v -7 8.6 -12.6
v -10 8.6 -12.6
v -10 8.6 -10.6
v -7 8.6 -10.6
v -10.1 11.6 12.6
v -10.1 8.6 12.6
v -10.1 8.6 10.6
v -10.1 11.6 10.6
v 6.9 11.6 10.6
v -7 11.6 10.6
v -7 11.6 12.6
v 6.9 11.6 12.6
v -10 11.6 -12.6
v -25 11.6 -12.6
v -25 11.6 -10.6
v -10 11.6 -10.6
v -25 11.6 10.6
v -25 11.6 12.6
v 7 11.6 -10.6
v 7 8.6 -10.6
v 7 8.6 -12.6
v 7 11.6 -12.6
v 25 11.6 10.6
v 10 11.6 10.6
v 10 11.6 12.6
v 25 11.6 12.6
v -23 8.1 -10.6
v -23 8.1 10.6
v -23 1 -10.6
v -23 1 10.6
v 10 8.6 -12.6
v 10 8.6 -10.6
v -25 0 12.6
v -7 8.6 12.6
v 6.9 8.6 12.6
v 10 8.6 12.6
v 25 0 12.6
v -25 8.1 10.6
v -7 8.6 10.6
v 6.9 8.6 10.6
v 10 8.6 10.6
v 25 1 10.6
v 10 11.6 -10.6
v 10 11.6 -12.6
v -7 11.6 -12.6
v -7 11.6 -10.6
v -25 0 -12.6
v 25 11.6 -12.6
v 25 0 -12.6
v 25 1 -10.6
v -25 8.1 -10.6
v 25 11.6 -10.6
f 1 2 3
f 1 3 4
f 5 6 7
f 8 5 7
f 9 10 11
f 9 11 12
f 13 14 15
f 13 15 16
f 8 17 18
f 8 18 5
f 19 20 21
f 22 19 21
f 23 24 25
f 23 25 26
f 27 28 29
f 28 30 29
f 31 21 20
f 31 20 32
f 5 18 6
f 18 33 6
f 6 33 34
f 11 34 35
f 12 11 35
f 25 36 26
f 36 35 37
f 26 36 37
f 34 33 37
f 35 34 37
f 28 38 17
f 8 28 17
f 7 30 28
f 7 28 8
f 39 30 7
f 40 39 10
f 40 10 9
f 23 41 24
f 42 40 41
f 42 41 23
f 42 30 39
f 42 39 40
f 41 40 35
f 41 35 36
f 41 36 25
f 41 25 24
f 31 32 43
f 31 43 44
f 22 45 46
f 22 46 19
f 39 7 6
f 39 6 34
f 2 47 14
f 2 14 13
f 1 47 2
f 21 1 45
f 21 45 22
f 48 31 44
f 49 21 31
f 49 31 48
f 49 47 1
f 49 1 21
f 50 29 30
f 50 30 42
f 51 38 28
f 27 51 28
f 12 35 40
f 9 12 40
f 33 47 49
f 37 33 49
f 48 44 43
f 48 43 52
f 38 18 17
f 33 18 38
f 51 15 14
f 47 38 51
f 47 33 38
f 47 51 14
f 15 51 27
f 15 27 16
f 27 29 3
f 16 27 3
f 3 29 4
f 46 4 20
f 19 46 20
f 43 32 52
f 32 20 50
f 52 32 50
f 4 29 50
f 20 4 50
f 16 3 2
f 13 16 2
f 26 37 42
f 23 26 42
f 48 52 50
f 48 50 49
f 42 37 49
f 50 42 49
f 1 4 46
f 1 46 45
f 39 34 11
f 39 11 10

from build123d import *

# Parameters (mm, degrees)
SKETCH_1_W      = 50
SKETCH_1_H      = 25.2
EXTRUDE_1_DEPTH = 1
SKETCH_2_W      = 50
SKETCH_2_H      = 2
EXTRUDE_2_DEPTH = 7.6
SKETCH_4_W      = 15
SKETCH_4_H      = 2
SKETCH_4_W_2    = 14
EXTRUDE_3_DEPTH = 3
SKETCH_5_W      = 14.9
SKETCH_5_H      = 2
SKETCH_5_W_2    = 13.9
SKETCH_5_W_3    = 15
EXTRUDE_4_DEPTH = 3
SKETCH_6_W      = 2
SKETCH_6_H      = 25.2
EXTRUDE_5_DEPTH = 3.6
SKETCH_7_W      = 2
SKETCH_7_H      = 21.2
EXTRUDE_6_DEPTH = 3.5


with BuildPart() as part:
    # 草图1 → 凸台-拉伸1 (new body)
    with BuildSketch(Plane(origin=(0, 0, 0), x_dir=(1, 0, 0), z_dir=(0, 1, 0))):
        Rectangle(SKETCH_1_W, SKETCH_1_H)
    extrude(amount=EXTRUDE_1_DEPTH)

    # 草图2 → 凸台-拉伸2 (add)
    with BuildSketch(Plane(origin=(0, 1, 0), x_dir=(1, 0, 0), z_dir=(0, 1, 0))):
        with Locations((0, 11.6)):
            Rectangle(SKETCH_2_W, SKETCH_2_H)
        with Locations((0, -11.6)):
            Rectangle(SKETCH_2_W, SKETCH_2_H)
    extrude(amount=EXTRUDE_2_DEPTH)

    # 草图4 → 凸台-拉伸3 (add)
    with BuildSketch(Plane(origin=(0, 8.6, 0), x_dir=(1, 0, 0), z_dir=(0, 1, 0))):
        with Locations((-17.5, 11.6)):
            Rectangle(SKETCH_4_W, SKETCH_4_H)
        with Locations((0, 11.6)):
            Rectangle(SKETCH_4_W_2, SKETCH_4_H)
        with Locations((17.5, 11.6)):
            Rectangle(SKETCH_4_W, SKETCH_4_H)
    extrude(amount=EXTRUDE_3_DEPTH)

    # 草图5 → 凸台-拉伸4 (add)
    with BuildSketch(Plane(origin=(0, 8.6, 0), x_dir=(1, 0, 0), z_dir=(0, 1, 0))):
        with Locations((-17.55, -11.6)):
            Rectangle(SKETCH_5_W, SKETCH_5_H)
        with Locations((-0.05, -11.6)):
            Rectangle(SKETCH_5_W_2, SKETCH_5_H)
        with Locations((17.5, -11.6)):
            Rectangle(SKETCH_5_W_3, SKETCH_5_H)
    extrude(amount=EXTRUDE_4_DEPTH)

    # 草图6 → 凸台-拉伸5 (add)
    with BuildSketch(Plane(origin=(0, 1, 0), x_dir=(1, 0, 0), z_dir=(0, 1, 0))):
        with Locations((-24, 0)):
            Rectangle(SKETCH_6_W, SKETCH_6_H)
    extrude(amount=EXTRUDE_5_DEPTH)

    # 草图7 → 凸台-拉伸6 (add)
    with BuildSketch(Plane(origin=(0, 4.6, 0), x_dir=(1, 0, 0), z_dir=(0, 1, 0))):
        with Locations((-24, 0)):
            Rectangle(SKETCH_7_W, SKETCH_7_H)
    extrude(amount=EXTRUDE_6_DEPTH)


solid = part.part
